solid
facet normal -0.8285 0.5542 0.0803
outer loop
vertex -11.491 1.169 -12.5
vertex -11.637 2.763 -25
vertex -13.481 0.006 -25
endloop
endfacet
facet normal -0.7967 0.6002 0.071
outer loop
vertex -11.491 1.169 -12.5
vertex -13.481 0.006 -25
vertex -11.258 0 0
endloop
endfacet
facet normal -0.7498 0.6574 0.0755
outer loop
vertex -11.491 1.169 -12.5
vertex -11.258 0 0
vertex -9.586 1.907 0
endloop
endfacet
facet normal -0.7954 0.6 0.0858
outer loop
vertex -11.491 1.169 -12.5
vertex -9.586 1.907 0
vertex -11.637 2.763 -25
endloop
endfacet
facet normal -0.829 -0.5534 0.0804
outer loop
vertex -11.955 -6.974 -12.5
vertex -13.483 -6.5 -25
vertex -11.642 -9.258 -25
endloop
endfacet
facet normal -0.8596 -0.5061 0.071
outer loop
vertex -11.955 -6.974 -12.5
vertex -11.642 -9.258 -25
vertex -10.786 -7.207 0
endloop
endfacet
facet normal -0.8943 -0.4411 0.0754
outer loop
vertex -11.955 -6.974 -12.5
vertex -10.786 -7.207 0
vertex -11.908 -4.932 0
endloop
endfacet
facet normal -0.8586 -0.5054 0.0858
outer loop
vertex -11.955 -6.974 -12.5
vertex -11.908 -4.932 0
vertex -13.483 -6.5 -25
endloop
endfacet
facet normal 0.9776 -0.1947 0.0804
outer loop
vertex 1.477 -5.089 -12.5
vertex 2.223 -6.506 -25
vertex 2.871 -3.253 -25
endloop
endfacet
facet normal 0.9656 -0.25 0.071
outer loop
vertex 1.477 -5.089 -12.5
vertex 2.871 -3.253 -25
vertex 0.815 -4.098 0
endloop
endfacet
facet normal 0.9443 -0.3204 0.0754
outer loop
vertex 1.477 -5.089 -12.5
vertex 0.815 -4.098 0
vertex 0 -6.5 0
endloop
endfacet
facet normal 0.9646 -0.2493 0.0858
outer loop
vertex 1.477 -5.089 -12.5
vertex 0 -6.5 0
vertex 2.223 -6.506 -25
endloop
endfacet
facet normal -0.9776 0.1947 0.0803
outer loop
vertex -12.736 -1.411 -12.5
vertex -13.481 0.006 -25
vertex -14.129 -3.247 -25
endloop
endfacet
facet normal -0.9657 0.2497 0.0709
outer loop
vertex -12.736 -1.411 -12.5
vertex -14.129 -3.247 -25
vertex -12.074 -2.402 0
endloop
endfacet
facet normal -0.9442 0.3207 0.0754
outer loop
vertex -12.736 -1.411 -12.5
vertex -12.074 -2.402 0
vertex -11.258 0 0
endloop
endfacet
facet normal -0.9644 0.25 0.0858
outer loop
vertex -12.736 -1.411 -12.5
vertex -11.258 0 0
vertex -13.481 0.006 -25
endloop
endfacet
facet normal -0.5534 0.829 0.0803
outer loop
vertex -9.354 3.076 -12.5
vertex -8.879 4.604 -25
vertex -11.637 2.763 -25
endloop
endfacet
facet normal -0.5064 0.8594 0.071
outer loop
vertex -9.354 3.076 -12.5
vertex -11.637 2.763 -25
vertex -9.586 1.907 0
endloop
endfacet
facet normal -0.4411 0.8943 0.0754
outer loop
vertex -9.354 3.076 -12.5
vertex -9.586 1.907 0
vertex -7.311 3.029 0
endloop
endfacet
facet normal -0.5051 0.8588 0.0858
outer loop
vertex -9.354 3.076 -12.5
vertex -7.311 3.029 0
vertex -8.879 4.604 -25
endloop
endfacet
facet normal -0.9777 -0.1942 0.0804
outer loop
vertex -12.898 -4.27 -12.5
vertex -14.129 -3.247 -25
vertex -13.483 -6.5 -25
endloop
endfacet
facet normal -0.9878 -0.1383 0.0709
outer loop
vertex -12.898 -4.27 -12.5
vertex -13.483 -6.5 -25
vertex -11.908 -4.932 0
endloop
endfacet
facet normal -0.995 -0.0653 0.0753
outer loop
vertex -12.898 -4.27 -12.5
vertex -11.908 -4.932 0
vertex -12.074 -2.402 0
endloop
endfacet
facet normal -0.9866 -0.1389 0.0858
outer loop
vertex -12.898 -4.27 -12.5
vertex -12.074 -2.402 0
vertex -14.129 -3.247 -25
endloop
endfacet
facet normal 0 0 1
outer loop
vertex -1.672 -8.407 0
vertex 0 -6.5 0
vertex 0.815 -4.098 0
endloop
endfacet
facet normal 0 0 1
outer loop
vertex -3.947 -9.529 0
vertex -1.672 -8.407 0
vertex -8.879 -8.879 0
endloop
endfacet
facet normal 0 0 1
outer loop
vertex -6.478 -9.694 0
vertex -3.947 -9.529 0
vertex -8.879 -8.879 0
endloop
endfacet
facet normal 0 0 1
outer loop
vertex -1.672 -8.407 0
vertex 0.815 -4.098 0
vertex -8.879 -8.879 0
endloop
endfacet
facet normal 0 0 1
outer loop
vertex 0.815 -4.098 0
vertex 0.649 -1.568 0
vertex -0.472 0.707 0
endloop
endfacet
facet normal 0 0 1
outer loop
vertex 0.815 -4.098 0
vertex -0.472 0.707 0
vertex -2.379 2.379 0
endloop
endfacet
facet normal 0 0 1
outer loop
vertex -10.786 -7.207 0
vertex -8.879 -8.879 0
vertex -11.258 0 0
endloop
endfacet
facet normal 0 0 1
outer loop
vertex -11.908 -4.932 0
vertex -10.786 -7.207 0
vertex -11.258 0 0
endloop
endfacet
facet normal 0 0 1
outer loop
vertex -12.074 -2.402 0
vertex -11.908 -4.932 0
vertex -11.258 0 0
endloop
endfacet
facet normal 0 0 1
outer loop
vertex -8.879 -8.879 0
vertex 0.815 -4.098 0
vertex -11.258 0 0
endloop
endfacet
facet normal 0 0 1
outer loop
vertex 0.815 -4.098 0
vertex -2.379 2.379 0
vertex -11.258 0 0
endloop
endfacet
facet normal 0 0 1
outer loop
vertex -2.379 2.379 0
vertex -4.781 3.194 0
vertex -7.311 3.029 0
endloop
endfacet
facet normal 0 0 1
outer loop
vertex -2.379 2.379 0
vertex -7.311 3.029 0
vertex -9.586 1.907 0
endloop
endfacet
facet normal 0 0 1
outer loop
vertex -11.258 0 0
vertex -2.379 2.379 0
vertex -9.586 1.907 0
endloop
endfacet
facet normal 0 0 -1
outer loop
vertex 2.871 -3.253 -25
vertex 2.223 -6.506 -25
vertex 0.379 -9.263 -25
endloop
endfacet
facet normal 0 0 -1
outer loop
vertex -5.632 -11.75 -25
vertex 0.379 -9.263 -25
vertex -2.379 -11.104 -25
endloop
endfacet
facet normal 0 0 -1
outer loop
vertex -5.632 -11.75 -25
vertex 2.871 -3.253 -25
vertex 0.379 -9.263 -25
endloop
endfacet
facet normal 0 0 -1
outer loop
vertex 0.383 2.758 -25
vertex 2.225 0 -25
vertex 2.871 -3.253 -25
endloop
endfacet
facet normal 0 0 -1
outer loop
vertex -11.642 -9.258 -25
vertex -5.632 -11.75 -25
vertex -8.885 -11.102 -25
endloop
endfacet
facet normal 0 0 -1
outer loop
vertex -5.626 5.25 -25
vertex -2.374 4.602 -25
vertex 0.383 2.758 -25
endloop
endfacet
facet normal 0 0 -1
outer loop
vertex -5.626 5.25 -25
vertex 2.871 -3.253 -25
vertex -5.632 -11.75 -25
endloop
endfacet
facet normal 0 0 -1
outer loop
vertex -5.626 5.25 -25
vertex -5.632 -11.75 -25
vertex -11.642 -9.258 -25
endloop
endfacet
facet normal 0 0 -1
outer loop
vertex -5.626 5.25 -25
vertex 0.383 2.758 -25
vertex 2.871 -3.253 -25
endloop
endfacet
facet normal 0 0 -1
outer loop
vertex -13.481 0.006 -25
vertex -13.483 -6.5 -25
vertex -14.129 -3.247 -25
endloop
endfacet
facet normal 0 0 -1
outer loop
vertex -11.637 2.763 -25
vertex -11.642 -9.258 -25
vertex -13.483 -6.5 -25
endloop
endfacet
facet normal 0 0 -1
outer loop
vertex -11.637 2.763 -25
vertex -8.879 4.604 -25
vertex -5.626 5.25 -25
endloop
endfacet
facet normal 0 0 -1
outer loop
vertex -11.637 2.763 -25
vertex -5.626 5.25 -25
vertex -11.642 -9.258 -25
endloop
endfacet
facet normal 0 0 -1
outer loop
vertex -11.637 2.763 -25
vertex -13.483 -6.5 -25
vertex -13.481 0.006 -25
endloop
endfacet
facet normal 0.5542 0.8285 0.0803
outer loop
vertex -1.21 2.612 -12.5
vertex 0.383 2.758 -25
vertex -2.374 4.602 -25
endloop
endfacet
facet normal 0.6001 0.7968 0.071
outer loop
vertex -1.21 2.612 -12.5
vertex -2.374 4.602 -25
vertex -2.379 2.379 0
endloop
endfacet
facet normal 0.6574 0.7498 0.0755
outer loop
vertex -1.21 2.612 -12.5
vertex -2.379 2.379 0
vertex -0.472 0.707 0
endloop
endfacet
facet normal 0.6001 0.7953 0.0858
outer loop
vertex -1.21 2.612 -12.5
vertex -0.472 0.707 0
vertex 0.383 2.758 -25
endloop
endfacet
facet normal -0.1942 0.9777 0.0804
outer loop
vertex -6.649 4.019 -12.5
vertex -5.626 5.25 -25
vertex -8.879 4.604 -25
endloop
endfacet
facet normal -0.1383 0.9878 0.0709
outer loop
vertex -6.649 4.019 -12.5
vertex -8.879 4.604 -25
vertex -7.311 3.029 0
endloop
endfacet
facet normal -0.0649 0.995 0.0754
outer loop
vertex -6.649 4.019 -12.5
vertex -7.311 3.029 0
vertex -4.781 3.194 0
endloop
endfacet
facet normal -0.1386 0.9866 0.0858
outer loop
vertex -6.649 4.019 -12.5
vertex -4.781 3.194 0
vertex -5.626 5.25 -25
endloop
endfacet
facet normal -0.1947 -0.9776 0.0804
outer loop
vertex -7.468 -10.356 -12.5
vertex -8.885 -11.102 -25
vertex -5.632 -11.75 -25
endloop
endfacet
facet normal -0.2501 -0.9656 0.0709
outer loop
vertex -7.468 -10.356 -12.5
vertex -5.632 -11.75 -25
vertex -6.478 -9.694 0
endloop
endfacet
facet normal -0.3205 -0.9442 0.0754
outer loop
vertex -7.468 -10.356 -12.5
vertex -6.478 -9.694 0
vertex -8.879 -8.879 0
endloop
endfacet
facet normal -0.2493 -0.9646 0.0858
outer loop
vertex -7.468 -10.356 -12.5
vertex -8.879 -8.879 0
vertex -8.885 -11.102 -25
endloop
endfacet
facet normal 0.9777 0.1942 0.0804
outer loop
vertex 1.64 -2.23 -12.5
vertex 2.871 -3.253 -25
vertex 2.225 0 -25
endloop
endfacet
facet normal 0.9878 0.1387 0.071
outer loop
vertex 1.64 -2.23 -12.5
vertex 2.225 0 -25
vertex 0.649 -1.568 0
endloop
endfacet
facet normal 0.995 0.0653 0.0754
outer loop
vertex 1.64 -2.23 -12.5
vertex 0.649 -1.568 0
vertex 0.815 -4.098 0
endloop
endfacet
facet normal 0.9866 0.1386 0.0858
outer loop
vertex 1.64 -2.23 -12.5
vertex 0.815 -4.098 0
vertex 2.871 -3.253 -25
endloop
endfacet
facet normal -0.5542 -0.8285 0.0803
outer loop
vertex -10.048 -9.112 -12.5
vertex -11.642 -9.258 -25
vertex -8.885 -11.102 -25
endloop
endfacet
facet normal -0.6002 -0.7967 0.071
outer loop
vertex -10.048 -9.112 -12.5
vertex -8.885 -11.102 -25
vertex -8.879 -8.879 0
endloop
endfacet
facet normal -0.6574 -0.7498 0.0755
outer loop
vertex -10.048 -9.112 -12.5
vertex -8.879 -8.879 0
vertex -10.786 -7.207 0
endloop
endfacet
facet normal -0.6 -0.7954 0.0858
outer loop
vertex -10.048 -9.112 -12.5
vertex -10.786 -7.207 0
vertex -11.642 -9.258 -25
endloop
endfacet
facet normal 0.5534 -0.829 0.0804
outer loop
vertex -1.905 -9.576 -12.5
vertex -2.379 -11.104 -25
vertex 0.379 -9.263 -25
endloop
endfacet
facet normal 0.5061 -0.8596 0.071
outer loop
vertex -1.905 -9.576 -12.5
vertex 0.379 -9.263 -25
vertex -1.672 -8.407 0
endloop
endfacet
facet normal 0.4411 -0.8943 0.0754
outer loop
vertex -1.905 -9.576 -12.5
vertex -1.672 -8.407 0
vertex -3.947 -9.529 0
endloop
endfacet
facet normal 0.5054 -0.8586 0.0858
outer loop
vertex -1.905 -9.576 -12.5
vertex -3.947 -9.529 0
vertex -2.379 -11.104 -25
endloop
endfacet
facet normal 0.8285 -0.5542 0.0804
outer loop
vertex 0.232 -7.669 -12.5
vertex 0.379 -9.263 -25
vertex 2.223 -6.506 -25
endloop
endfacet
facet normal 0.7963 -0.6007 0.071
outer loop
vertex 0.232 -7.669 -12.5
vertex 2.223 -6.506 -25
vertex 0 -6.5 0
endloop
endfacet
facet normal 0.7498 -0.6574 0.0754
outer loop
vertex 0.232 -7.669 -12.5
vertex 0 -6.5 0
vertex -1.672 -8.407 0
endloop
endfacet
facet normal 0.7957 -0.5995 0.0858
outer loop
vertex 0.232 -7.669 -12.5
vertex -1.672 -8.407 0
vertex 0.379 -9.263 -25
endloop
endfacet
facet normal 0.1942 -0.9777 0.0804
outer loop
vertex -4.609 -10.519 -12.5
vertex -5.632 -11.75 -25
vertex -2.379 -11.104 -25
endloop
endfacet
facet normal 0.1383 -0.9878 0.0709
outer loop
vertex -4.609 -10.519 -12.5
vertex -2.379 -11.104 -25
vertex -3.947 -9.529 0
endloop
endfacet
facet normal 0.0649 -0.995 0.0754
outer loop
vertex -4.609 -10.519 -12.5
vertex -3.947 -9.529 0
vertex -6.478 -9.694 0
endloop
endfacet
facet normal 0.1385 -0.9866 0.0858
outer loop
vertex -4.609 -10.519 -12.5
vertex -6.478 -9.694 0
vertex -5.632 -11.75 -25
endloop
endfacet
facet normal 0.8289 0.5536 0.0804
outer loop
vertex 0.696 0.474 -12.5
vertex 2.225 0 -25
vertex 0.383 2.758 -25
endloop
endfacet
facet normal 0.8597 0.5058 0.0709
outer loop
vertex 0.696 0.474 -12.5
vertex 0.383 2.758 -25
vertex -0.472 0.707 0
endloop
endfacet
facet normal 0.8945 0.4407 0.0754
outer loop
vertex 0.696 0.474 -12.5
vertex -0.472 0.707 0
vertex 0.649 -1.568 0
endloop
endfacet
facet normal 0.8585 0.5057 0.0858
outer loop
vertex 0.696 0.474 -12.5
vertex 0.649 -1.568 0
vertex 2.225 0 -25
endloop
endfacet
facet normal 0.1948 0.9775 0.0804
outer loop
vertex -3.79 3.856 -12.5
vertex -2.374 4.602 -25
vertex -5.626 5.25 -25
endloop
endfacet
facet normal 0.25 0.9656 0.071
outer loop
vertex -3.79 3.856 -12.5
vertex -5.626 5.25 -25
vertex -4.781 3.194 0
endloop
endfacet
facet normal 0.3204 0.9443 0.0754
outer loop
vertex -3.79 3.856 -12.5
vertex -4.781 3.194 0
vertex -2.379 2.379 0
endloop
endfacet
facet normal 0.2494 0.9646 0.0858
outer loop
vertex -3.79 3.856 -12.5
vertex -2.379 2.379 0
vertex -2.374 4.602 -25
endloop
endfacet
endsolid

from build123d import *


with BuildPart() as f3:
    # F2 (on offset) → F3 section 0
    with BuildSketch(Plane.XY.offset(-25)):
        Polygon((2.870834, -3.25304), (2.224974, 0), (0.383392, 2.758257), (-2.373547, 4.601812), (-5.626125, 5.249999), (-8.879165, 4.604139), (-11.637422, 2.762557), (-13.480977, 0.005618), (-14.129165, -3.24696), (-13.483304, -6.5), (-11.641722, -9.258257), (-8.884783, -11.101812), (-5.632206, -11.749999), (-2.379165, -11.104139), (0.379092, -9.262557), (2.222647, -6.505618), align=None)
    # F0 (on Top) → F3 section 1
    with BuildSketch(Plane.XY):
        Polygon((-1.672216, -8.406797), (0, -6.5), (0.815226, -4.09842), (0.649353, -1.567676), (-0.472368, 0.706949), (-2.379165, 2.379165), (-4.780745, 3.194392), (-7.311489, 3.028518), (-9.586114, 1.906797), (-11.25833, 0), (-12.073557, -2.40158), (-11.907683, -4.932324), (-10.785962, -7.206949), (-8.879165, -8.879165), (-6.477585, -9.694392), (-3.946841, -9.528518), align=None)
    loft()


solid = f3.part
